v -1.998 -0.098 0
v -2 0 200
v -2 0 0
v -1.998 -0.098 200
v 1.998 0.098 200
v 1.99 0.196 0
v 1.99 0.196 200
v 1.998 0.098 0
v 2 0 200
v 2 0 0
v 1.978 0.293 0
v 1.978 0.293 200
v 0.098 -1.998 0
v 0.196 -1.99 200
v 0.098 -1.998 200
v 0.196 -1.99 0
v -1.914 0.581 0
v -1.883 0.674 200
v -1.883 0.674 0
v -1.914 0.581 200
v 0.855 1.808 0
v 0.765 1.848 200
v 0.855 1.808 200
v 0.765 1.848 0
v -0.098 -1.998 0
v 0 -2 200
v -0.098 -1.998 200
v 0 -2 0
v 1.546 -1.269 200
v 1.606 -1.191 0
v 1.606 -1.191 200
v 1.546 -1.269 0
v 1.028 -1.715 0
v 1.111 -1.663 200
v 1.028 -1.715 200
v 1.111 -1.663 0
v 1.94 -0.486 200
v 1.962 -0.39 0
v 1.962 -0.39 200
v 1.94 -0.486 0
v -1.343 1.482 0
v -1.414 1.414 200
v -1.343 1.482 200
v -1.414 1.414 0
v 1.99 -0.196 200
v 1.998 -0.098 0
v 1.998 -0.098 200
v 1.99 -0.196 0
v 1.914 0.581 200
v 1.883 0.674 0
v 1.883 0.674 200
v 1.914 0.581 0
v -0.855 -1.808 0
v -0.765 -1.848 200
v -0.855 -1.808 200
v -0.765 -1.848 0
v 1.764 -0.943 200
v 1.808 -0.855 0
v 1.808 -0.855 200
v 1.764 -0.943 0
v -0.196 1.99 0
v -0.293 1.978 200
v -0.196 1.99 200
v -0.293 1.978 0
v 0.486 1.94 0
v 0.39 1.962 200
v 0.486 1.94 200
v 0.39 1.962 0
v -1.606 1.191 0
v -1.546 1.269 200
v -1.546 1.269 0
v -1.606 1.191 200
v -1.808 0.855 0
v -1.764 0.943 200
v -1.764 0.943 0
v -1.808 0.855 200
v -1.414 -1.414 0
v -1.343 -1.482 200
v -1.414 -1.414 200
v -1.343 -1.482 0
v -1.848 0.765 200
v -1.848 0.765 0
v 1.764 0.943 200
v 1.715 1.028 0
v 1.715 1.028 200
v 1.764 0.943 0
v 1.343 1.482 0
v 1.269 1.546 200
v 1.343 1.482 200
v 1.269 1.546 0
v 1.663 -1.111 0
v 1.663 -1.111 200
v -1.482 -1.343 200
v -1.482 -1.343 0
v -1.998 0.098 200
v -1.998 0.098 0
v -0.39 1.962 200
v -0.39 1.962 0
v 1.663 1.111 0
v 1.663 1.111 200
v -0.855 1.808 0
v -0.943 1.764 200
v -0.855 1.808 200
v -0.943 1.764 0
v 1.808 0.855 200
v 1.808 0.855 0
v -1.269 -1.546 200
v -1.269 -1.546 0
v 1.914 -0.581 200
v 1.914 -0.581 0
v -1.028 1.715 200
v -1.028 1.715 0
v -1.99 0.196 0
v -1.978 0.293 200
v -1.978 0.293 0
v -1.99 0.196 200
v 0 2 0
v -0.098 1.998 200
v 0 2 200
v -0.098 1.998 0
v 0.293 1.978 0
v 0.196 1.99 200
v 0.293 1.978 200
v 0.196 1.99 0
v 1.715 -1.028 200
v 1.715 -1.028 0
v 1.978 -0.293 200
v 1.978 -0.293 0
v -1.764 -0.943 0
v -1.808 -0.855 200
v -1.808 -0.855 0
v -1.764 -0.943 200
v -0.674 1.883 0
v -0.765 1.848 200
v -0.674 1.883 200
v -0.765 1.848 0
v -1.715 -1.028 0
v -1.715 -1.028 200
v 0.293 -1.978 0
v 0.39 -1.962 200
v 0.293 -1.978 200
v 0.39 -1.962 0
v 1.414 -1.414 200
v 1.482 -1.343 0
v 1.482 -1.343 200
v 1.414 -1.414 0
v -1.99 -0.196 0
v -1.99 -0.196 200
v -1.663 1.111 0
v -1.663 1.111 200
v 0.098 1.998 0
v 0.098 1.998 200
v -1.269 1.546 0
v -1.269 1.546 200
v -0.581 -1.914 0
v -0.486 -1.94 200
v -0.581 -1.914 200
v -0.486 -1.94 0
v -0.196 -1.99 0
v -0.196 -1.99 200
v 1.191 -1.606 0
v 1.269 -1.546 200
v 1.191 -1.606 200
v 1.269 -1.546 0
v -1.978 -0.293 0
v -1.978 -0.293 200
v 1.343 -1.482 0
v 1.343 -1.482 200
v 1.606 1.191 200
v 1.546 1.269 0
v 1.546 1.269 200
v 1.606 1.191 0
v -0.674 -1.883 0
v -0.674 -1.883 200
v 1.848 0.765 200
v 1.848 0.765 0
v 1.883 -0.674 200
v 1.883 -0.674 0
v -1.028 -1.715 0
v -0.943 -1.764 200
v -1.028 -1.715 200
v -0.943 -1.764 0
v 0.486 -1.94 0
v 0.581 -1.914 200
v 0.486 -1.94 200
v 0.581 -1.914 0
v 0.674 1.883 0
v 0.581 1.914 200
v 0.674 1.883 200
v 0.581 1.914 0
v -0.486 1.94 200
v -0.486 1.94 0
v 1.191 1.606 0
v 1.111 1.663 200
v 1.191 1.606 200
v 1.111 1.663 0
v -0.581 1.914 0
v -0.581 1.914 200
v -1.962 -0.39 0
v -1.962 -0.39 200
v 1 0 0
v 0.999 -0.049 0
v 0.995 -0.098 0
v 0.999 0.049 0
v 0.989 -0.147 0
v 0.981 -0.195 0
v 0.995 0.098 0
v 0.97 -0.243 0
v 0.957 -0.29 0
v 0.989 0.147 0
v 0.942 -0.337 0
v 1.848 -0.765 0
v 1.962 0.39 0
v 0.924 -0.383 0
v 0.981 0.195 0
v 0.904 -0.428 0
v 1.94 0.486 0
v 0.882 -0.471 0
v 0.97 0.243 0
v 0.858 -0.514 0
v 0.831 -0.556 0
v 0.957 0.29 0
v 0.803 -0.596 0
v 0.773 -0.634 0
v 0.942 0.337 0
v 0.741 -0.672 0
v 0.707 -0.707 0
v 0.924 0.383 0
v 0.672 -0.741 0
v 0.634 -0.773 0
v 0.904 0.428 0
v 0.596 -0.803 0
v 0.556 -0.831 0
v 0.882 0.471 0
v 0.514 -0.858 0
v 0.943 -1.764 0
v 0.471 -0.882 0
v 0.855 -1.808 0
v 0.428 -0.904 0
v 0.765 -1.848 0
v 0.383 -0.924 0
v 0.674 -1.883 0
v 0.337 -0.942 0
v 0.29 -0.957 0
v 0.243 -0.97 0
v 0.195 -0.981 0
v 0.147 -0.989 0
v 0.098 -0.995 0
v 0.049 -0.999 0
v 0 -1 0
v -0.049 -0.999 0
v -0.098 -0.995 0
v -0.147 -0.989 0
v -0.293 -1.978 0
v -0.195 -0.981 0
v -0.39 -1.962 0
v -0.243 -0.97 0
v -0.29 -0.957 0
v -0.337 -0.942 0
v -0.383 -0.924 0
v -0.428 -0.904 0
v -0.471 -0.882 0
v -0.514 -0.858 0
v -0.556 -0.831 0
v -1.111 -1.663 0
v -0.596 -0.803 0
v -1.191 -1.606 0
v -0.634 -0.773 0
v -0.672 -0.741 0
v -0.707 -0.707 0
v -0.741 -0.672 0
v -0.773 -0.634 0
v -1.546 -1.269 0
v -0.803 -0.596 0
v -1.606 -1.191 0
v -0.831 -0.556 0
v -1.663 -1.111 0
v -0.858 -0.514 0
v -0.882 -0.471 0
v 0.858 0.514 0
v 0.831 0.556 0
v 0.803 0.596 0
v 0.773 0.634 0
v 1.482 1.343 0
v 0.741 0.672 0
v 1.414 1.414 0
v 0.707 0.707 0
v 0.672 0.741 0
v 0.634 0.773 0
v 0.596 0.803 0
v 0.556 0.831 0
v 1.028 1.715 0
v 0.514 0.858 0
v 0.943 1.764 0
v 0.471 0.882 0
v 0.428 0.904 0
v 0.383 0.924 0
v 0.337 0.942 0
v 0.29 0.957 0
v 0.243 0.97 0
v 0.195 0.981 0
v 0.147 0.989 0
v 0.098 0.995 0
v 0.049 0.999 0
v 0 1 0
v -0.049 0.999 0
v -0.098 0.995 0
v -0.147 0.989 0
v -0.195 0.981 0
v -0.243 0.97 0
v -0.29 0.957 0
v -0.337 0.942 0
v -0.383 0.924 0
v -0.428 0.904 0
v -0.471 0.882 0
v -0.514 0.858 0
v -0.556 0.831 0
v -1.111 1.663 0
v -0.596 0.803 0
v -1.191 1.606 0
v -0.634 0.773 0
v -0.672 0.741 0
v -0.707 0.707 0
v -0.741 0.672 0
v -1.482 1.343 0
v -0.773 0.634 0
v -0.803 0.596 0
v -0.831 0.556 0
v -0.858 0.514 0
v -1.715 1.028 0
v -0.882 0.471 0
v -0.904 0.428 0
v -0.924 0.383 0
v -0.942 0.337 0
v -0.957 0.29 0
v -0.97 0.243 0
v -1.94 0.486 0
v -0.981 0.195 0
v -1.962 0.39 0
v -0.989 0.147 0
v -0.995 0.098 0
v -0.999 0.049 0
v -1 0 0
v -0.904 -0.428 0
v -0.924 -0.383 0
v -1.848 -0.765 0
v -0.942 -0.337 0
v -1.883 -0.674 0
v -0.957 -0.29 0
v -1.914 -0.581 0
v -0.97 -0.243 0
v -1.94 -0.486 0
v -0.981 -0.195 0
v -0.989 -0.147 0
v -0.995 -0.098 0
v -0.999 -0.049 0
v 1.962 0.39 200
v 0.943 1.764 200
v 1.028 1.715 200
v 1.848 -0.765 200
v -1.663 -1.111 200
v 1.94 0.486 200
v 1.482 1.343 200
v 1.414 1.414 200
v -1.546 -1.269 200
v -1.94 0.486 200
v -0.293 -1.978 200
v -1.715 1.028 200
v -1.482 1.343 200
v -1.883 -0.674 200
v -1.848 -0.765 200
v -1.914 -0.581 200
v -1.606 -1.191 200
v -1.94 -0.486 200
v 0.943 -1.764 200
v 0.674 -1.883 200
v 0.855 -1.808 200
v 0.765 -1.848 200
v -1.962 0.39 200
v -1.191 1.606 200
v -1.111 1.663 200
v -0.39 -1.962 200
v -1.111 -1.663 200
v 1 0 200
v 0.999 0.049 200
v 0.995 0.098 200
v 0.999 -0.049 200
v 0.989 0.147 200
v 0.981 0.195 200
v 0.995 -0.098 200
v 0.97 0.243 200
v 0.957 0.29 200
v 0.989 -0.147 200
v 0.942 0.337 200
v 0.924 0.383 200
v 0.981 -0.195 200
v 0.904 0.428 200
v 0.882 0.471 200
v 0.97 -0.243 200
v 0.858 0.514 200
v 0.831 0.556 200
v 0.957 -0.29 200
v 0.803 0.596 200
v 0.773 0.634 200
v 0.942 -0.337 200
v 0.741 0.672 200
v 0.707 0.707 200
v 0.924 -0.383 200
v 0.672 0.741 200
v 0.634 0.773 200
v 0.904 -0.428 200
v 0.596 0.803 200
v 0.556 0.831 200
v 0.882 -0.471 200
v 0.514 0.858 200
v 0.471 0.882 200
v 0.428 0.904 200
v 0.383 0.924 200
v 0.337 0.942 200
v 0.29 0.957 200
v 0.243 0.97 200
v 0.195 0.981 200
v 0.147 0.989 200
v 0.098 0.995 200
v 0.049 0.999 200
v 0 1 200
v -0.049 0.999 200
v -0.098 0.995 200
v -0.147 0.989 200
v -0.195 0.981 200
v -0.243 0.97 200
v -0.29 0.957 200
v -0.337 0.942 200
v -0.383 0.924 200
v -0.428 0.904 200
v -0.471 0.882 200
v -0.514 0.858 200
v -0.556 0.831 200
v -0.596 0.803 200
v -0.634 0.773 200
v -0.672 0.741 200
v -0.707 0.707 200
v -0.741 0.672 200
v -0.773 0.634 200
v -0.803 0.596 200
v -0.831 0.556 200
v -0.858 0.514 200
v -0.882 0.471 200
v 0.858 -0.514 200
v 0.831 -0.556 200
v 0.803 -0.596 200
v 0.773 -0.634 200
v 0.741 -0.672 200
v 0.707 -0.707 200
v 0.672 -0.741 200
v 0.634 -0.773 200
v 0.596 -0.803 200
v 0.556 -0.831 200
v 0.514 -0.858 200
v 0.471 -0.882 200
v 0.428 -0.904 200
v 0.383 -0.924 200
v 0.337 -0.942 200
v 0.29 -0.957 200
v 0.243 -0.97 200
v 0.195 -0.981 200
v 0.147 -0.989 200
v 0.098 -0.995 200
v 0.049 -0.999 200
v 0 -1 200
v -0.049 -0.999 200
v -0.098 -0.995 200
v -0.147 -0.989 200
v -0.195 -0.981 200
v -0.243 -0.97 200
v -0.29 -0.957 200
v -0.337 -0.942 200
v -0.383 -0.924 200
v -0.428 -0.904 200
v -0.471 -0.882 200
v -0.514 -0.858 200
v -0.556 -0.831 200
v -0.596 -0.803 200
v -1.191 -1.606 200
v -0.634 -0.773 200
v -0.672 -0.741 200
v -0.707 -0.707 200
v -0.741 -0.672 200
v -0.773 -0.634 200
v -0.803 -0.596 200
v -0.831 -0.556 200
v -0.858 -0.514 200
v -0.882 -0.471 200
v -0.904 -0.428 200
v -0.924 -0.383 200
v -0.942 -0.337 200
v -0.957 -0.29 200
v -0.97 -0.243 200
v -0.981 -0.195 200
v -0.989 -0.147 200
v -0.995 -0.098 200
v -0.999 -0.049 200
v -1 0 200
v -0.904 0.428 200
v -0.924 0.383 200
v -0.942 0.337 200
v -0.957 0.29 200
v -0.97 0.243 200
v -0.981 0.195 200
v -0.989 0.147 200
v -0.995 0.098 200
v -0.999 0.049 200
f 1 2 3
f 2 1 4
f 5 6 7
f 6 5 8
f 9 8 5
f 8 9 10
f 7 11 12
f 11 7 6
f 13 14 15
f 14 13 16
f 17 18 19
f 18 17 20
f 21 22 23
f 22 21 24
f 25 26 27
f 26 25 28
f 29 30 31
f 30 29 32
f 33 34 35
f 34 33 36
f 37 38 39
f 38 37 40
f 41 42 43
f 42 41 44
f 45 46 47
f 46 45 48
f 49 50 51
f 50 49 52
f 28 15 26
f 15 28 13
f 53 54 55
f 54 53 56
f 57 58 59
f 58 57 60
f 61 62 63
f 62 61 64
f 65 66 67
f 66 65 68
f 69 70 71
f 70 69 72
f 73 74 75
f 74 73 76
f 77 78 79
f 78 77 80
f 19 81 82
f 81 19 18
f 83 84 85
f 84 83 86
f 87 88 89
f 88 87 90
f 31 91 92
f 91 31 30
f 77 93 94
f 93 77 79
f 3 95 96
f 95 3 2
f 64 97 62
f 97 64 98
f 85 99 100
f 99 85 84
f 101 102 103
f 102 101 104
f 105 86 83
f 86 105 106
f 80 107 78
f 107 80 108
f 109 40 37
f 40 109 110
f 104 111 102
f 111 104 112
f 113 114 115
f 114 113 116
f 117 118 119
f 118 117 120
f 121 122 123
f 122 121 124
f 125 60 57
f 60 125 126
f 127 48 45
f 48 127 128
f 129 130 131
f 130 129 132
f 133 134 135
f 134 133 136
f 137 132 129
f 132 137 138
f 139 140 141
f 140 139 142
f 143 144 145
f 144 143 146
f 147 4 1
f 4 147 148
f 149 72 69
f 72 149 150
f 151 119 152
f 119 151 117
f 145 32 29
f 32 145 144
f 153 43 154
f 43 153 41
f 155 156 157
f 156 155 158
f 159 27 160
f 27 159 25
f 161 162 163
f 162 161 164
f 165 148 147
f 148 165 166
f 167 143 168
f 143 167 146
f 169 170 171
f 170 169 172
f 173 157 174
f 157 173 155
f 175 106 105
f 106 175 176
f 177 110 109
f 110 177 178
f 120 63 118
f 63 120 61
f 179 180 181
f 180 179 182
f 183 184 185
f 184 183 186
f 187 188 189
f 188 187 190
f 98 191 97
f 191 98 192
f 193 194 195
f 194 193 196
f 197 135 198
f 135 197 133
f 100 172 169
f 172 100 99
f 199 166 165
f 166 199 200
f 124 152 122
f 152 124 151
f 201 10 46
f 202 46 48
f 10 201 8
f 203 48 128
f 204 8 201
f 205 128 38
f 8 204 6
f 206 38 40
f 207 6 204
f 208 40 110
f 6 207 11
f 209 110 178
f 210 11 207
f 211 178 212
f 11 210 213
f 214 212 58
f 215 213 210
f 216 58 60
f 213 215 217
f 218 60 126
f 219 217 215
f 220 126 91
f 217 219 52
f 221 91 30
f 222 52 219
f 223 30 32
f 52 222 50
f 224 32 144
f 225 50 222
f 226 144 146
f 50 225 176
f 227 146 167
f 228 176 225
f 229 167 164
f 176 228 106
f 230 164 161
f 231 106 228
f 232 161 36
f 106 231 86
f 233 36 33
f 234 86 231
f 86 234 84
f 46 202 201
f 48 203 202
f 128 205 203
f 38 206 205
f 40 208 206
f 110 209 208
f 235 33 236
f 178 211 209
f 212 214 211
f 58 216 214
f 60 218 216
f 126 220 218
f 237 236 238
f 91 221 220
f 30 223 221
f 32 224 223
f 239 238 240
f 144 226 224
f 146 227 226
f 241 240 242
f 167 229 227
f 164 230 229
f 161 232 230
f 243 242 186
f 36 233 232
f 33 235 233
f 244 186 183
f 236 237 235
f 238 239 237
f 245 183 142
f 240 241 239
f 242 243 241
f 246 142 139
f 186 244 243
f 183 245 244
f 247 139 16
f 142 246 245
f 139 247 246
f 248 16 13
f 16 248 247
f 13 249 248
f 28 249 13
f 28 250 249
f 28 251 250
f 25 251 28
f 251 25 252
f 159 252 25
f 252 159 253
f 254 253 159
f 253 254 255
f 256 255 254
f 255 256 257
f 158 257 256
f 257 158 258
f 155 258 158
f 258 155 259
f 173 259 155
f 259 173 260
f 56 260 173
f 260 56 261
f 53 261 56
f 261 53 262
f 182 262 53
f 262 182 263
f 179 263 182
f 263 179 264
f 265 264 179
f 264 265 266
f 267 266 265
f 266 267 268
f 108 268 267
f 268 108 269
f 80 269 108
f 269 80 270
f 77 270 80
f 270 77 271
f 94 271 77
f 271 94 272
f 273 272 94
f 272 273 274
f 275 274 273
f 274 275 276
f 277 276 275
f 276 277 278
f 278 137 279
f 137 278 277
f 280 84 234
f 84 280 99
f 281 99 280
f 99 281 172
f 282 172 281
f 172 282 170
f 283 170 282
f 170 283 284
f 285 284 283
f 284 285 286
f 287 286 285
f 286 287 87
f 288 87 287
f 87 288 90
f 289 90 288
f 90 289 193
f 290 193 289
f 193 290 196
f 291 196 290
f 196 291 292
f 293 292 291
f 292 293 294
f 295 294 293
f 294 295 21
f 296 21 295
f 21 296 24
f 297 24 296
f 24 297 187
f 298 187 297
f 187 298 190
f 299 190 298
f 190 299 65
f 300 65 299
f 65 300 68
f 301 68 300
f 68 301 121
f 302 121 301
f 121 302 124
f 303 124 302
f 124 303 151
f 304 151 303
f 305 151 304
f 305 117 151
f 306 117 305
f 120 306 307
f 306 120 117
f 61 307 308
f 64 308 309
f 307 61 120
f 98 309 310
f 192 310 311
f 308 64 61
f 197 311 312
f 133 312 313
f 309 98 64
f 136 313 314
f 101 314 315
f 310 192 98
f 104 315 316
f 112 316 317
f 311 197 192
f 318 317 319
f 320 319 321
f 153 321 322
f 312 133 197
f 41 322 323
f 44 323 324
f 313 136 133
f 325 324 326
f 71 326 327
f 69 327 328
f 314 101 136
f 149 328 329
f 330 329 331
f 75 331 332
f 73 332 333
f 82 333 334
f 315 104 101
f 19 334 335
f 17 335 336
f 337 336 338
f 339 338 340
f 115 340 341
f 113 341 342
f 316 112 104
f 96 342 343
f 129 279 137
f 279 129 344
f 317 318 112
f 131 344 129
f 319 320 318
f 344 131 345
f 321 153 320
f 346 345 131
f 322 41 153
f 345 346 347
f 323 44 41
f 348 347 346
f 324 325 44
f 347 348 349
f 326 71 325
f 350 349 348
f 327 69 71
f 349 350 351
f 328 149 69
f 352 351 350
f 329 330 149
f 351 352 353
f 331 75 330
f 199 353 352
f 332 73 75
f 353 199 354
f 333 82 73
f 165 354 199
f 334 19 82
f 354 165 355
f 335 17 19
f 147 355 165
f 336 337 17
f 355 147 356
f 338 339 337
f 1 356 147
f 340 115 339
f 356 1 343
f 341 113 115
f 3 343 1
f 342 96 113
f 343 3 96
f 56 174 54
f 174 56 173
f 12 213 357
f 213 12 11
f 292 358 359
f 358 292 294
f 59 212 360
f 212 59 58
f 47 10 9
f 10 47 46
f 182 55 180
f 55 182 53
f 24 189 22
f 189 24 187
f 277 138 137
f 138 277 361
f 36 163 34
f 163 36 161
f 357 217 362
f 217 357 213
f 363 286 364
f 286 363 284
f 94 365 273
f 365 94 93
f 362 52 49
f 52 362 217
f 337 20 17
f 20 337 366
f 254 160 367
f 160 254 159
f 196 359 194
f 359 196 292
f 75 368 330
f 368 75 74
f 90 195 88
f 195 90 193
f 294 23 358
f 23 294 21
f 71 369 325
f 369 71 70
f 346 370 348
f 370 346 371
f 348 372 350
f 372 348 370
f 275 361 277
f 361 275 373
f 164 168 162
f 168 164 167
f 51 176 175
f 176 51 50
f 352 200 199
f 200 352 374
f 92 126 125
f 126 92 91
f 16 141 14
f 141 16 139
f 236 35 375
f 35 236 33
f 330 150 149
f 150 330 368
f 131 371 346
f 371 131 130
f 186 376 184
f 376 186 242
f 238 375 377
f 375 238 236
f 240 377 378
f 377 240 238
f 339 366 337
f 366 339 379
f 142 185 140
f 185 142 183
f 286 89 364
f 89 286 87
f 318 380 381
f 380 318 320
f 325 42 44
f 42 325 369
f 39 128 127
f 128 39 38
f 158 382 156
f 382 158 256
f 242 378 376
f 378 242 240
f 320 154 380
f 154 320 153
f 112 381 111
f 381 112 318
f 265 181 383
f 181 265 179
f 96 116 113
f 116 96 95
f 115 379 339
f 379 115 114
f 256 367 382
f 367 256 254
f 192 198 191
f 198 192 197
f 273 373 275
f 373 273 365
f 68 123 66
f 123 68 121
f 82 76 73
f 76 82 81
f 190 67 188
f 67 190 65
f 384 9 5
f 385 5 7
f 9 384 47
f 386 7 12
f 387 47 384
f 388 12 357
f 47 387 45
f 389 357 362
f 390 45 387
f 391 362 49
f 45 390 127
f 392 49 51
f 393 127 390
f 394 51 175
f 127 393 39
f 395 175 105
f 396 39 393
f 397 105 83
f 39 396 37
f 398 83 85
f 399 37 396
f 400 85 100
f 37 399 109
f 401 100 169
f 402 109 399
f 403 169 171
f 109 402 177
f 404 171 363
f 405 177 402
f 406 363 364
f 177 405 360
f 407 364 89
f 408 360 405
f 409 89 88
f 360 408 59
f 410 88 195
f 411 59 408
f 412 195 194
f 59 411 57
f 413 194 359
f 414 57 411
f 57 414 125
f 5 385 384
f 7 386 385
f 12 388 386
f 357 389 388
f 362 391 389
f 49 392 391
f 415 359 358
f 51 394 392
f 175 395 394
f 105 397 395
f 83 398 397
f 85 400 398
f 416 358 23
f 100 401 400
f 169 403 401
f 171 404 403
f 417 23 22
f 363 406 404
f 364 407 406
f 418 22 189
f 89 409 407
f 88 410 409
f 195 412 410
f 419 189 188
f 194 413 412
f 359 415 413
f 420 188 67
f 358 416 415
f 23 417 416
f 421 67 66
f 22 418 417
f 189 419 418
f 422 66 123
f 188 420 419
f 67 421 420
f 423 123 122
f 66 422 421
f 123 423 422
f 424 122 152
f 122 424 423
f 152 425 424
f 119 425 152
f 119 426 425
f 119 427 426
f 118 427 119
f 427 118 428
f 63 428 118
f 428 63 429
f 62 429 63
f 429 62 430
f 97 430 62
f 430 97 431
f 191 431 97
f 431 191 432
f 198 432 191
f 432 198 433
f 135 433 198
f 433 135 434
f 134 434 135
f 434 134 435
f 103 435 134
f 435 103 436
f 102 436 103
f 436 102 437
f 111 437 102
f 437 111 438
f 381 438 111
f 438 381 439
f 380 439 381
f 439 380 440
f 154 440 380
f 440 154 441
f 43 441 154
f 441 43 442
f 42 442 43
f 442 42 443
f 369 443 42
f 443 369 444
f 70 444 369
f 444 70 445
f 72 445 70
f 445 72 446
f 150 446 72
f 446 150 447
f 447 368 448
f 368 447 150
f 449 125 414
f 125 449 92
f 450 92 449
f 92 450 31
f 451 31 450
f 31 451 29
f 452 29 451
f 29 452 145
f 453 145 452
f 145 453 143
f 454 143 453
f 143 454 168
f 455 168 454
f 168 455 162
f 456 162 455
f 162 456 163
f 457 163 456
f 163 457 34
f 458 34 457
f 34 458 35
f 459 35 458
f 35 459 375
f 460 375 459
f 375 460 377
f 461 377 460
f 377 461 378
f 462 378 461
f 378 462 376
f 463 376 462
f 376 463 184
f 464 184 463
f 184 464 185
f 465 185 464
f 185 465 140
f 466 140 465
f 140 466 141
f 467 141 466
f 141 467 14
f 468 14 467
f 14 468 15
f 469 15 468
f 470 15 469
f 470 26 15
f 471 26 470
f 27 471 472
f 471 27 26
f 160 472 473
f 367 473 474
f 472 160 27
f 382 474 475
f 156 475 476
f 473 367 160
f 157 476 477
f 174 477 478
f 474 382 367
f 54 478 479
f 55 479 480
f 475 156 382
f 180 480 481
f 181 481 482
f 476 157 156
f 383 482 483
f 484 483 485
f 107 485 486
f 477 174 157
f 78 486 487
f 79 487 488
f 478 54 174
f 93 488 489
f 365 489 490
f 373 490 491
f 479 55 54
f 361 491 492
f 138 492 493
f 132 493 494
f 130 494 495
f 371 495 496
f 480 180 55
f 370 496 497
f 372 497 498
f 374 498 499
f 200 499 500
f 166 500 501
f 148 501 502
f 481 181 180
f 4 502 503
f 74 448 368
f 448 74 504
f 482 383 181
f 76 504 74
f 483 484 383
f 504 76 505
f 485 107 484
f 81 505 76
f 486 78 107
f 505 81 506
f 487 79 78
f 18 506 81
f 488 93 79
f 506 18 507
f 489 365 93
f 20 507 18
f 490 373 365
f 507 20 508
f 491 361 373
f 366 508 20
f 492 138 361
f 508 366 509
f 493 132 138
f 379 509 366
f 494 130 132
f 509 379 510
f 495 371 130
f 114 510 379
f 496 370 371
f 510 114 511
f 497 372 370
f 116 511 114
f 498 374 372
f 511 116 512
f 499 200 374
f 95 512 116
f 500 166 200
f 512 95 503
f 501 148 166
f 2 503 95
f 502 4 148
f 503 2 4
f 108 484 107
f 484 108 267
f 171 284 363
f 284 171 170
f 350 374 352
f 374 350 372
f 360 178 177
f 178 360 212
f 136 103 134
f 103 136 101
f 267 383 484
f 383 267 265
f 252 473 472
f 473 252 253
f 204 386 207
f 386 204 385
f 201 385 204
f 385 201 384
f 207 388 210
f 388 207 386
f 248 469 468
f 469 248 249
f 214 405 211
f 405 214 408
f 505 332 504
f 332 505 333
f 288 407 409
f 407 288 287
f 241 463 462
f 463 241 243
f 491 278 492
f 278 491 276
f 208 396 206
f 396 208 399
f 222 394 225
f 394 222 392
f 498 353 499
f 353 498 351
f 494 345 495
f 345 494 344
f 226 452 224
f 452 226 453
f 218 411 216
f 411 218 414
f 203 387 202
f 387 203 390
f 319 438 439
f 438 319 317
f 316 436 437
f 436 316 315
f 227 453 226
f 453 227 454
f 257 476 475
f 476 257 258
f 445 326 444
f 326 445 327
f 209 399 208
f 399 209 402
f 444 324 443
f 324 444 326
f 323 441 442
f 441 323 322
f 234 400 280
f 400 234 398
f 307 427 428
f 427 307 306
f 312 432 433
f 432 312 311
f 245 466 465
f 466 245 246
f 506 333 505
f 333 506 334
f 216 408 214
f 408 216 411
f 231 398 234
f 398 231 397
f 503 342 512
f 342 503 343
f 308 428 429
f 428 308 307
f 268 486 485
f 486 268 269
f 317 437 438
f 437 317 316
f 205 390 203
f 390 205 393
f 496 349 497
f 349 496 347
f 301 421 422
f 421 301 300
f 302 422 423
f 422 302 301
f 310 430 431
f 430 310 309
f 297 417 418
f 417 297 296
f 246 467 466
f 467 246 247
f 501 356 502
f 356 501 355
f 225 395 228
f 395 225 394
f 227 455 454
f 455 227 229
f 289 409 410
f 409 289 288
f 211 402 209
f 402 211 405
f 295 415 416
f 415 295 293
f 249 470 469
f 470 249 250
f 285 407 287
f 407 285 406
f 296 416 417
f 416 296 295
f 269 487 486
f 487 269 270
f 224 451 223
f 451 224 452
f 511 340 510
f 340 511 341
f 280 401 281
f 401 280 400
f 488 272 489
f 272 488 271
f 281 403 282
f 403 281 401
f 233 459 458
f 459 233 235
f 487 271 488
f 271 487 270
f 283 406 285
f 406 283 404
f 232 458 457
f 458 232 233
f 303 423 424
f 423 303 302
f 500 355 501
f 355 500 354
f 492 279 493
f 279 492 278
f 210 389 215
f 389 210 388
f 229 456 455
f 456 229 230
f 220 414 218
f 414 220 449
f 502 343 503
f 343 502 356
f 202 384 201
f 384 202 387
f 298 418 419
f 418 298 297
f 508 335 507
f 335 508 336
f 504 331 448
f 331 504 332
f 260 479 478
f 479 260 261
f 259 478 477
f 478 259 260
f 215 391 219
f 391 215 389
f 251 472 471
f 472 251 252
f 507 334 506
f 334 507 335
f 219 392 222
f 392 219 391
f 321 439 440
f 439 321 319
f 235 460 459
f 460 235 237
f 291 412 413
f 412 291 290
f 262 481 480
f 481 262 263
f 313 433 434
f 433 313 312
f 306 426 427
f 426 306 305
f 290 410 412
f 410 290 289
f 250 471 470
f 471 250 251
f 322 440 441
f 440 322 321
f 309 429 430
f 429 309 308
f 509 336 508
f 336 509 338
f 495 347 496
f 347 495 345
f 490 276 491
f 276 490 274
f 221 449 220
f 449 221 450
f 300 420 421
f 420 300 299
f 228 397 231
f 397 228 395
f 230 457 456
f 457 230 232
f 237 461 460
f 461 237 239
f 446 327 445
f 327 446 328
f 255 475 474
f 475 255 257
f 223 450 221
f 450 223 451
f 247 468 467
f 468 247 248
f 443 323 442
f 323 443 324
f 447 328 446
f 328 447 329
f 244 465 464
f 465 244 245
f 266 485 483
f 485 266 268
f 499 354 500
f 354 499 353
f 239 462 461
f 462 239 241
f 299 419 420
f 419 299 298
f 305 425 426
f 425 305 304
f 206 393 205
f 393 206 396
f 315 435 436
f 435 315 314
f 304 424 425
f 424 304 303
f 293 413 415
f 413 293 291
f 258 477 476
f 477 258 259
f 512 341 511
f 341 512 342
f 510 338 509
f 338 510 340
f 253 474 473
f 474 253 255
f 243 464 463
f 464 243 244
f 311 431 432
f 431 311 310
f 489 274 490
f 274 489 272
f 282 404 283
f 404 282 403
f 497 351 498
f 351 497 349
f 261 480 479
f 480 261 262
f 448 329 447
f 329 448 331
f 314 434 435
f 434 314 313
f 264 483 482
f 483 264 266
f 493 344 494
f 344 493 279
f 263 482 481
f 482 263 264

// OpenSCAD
$fn = 128;

// PTFE tubing (simple hollow cylinder)
// Units: mm
outer_d = 4.0;     // typical PTFE tube OD
inner_d = 2.0;     // typical PTFE tube ID
length  = 200.0;   // tube length

module ptfe_tube(od, id, h) {
    difference() {
        cylinder(d=od, h=h, center=false);
        translate([0,0,-0.1]) cylinder(d=id, h=h+0.2, center=false);
    }
}

ptfe_tube(outer_d, inner_d, length);
